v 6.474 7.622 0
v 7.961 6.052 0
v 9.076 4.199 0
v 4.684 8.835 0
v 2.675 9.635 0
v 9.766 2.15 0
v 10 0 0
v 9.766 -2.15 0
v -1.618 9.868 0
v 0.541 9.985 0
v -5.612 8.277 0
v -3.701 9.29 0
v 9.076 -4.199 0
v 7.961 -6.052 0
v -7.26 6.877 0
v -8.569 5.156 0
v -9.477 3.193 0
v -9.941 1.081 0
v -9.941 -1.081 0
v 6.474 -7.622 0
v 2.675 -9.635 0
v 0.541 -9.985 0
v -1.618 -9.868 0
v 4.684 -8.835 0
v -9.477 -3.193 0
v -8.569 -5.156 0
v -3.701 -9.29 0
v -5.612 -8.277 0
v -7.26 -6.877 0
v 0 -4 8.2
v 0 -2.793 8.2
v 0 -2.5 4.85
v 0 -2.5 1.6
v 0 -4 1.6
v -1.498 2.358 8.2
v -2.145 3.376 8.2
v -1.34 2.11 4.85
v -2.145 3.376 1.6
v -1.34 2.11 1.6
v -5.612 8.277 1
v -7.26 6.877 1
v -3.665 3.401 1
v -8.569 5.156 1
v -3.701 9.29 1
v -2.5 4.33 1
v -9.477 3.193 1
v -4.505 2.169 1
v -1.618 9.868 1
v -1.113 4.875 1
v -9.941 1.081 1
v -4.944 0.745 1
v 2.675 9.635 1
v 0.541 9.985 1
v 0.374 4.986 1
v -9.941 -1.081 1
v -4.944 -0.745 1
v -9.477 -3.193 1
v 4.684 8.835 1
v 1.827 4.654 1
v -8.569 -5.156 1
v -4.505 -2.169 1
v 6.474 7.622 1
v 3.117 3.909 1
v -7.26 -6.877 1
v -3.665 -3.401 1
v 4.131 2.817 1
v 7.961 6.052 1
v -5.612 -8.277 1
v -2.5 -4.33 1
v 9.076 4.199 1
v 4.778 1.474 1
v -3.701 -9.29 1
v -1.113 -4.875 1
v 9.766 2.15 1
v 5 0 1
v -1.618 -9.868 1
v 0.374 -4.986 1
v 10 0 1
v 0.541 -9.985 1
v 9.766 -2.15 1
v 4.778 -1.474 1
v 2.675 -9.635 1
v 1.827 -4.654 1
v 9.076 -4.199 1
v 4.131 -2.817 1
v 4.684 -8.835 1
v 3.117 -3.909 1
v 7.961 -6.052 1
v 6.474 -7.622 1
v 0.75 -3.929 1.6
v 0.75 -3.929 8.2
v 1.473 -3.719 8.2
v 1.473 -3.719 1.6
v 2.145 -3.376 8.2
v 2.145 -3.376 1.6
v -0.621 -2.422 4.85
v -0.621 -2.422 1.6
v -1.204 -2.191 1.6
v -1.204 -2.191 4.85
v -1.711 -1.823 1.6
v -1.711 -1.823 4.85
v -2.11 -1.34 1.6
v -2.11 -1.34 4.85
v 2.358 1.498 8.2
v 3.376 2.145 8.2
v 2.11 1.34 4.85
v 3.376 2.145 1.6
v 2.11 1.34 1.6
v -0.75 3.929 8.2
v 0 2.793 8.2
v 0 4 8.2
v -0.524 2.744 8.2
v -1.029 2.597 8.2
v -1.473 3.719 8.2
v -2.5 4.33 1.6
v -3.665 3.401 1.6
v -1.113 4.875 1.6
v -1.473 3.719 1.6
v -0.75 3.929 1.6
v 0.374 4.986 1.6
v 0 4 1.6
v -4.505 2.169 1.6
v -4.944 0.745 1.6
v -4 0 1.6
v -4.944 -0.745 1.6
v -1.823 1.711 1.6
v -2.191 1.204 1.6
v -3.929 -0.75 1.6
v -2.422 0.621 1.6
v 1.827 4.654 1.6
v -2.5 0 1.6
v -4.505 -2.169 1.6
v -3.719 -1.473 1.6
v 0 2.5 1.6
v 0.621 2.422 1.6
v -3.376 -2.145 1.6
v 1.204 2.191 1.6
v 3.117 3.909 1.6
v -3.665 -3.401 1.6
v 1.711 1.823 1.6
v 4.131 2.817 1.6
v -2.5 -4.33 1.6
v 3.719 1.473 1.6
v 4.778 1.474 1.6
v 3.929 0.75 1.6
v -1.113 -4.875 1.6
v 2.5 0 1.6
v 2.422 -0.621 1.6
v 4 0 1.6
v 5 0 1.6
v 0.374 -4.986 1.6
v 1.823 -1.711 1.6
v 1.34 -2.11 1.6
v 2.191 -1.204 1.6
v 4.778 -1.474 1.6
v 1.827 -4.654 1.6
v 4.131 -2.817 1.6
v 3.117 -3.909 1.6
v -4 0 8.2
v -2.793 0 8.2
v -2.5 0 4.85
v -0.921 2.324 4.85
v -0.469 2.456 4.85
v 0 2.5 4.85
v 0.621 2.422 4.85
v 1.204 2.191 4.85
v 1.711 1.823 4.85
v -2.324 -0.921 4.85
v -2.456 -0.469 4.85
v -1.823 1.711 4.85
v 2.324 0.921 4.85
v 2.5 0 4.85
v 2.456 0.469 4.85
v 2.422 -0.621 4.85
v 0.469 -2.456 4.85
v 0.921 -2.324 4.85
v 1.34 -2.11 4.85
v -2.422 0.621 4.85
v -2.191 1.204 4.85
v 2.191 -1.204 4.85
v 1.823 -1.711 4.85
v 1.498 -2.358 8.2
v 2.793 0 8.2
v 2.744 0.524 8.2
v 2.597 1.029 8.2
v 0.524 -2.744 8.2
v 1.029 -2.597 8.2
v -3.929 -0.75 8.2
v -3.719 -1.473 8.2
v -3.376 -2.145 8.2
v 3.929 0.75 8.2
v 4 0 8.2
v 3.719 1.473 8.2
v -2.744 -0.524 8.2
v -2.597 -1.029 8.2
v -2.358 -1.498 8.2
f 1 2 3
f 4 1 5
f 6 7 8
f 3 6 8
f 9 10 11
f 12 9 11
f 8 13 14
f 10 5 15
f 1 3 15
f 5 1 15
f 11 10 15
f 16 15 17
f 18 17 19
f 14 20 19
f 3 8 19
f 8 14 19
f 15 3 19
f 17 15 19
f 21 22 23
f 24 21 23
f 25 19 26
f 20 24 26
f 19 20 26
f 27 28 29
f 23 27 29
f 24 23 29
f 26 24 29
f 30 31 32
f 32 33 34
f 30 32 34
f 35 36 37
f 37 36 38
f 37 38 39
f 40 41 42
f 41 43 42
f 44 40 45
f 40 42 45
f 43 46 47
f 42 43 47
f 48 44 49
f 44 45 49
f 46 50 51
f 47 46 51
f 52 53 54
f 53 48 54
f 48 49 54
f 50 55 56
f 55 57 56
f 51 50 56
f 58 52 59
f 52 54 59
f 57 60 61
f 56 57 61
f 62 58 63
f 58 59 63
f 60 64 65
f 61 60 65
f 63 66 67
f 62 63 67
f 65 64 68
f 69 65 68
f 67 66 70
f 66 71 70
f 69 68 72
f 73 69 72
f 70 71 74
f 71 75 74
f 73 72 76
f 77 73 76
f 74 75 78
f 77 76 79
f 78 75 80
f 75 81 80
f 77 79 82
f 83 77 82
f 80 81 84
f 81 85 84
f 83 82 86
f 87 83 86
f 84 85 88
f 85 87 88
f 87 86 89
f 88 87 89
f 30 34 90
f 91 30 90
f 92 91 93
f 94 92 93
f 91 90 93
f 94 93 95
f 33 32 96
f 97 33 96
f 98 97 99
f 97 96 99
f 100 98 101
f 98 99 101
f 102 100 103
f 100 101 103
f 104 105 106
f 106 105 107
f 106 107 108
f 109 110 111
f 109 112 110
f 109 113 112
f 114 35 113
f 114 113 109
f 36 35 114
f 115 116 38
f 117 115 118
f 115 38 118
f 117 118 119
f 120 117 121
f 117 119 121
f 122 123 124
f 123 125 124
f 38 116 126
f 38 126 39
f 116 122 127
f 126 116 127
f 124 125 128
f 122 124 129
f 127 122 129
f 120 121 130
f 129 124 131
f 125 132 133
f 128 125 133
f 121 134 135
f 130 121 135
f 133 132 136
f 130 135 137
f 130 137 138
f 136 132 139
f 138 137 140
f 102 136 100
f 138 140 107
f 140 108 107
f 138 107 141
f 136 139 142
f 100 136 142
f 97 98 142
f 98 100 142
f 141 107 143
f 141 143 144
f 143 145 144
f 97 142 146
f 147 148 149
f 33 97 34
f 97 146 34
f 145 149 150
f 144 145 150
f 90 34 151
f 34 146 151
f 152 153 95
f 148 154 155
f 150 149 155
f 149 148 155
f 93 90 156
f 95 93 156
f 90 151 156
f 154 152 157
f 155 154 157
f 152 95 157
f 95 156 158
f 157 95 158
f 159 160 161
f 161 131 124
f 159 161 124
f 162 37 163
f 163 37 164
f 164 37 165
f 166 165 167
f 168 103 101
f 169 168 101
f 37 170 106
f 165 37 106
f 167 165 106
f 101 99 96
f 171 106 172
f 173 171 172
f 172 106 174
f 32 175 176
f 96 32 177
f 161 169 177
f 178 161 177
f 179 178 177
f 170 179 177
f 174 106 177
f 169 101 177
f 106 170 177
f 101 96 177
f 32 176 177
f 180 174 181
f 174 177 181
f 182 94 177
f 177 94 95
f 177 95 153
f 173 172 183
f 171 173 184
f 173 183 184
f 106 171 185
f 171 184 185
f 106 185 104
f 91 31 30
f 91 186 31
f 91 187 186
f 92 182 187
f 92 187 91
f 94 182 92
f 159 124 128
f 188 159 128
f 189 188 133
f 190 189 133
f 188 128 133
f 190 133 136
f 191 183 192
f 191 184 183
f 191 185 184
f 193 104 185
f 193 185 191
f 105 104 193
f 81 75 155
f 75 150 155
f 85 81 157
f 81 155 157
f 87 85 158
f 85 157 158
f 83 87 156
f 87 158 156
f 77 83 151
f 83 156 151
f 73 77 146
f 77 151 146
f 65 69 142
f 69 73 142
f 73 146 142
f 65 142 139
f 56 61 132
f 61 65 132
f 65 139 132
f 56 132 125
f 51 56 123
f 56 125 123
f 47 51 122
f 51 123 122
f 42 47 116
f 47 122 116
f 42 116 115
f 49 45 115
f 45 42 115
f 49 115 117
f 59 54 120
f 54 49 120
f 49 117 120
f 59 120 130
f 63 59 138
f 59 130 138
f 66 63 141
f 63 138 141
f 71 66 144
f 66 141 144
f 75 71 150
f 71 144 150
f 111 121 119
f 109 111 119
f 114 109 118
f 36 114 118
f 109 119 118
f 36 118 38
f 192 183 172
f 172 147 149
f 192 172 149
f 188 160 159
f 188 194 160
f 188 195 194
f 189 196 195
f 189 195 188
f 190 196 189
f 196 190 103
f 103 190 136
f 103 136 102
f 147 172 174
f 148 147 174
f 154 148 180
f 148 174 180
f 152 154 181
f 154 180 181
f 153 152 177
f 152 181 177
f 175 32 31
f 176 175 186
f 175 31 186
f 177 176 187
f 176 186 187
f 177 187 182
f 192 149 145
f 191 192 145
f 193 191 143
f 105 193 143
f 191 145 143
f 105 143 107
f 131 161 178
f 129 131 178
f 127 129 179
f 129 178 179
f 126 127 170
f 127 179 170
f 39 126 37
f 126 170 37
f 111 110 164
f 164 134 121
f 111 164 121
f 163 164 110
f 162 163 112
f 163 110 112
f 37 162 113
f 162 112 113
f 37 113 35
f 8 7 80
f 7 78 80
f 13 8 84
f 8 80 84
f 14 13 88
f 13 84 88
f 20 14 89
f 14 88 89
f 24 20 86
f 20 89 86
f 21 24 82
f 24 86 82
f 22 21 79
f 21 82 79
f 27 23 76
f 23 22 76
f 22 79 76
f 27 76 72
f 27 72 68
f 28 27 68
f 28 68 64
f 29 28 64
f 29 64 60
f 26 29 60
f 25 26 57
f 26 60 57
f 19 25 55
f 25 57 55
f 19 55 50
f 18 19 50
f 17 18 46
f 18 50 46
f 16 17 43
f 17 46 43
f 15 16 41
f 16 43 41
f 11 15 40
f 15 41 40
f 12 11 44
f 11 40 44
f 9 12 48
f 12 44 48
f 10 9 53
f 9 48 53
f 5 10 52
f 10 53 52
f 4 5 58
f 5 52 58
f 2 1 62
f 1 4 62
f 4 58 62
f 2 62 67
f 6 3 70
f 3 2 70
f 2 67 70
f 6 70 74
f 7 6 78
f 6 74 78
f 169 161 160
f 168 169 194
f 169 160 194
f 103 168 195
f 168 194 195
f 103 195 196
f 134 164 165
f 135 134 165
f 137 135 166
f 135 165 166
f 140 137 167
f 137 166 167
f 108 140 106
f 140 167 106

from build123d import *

# Parameters (mm, degrees)
F3_DEPTH = 6.6
F4_COUNT = 4
F5_DEPTH = 3.35
F5_TAPER = -5


with BuildPart() as f1:
    # F0 (on Front) → F1 (revolve)
    with BuildSketch(Plane.XZ):
        Polygon((0, 4.85), (0, 0), (10, 0), (10, 1), (5, 1), (5, 1.6), (2.5, 1.6), (2.5, 3.85), (2.5, 4.85), align=None)
    revolve(axis=Axis((0, 0, 2.425), (0, 0, -1)))

    # F2 (on face) → F3 (join)
    with BuildSketch(Plane.XY.offset(1.6)):
        with BuildLine():
            ThreePointArc((4, 0), (3.8409617055, 1.1166974421), (3.3764934114, 2.1445960558))
            Line((3.3764934114, 2.1445960558), (2.1103083822, 1.3403725349))
            ThreePointArc((2.1103083822, 1.3403725349), (2.4006010659, 0.6979359013), (2.5, 0))
            Line((2.5, 0), (4, 0))
        make_face()
    extrude(amount=F3_DEPTH)

    # F4: F1 ×4 about axis
    f4_axis = Axis((0, 0, 2.425), (0, 0, -1))


with BuildPart() as f1_1:
    add(f1.part)
    for i in range(1, F4_COUNT):
        add(f1.part.rotate(f4_axis, i * 360 / F4_COUNT))

    # F1_face1 (on face) → F5 (cut, through all)
    with BuildSketch(Plane.XY.offset(4.85)):
        with BuildLine():
            ThreePointArc((1.3403725349, -2.1103083822), (2.1909965013, -1.203966084), (2.5, 0))
            ThreePointArc((2.5, 0), (2.4006010659, 0.6979359013), (2.1103083822, 1.3403725349))
            ThreePointArc((2.1103083822, 1.3403725349), (1.203966084, 2.1909965013), (0, 2.5))
            ThreePointArc((0, 2.5), (-0.6979359013, 2.4006010659), (-1.3403725349, 2.1103083822))
            ThreePointArc((-1.3403725349, 2.1103083822), (-2.1909965013, 1.203966084), (-2.5, 0))
            ThreePointArc((-2.5, 0), (-2.4006010659, -0.6979359013), (-2.1103083822, -1.3403725349))
            ThreePointArc((-2.1103083822, -1.3403725349), (-1.203966084, -2.1909965013), (0, -2.5))
            ThreePointArc((0, -2.5), (0.6979359013, -2.4006010659), (1.3403725349, -2.1103083822))
        make_face()
    extrude(amount=F5_DEPTH, taper=F5_TAPER, mode=Mode.SUBTRACT)


solid = f1_1.part
